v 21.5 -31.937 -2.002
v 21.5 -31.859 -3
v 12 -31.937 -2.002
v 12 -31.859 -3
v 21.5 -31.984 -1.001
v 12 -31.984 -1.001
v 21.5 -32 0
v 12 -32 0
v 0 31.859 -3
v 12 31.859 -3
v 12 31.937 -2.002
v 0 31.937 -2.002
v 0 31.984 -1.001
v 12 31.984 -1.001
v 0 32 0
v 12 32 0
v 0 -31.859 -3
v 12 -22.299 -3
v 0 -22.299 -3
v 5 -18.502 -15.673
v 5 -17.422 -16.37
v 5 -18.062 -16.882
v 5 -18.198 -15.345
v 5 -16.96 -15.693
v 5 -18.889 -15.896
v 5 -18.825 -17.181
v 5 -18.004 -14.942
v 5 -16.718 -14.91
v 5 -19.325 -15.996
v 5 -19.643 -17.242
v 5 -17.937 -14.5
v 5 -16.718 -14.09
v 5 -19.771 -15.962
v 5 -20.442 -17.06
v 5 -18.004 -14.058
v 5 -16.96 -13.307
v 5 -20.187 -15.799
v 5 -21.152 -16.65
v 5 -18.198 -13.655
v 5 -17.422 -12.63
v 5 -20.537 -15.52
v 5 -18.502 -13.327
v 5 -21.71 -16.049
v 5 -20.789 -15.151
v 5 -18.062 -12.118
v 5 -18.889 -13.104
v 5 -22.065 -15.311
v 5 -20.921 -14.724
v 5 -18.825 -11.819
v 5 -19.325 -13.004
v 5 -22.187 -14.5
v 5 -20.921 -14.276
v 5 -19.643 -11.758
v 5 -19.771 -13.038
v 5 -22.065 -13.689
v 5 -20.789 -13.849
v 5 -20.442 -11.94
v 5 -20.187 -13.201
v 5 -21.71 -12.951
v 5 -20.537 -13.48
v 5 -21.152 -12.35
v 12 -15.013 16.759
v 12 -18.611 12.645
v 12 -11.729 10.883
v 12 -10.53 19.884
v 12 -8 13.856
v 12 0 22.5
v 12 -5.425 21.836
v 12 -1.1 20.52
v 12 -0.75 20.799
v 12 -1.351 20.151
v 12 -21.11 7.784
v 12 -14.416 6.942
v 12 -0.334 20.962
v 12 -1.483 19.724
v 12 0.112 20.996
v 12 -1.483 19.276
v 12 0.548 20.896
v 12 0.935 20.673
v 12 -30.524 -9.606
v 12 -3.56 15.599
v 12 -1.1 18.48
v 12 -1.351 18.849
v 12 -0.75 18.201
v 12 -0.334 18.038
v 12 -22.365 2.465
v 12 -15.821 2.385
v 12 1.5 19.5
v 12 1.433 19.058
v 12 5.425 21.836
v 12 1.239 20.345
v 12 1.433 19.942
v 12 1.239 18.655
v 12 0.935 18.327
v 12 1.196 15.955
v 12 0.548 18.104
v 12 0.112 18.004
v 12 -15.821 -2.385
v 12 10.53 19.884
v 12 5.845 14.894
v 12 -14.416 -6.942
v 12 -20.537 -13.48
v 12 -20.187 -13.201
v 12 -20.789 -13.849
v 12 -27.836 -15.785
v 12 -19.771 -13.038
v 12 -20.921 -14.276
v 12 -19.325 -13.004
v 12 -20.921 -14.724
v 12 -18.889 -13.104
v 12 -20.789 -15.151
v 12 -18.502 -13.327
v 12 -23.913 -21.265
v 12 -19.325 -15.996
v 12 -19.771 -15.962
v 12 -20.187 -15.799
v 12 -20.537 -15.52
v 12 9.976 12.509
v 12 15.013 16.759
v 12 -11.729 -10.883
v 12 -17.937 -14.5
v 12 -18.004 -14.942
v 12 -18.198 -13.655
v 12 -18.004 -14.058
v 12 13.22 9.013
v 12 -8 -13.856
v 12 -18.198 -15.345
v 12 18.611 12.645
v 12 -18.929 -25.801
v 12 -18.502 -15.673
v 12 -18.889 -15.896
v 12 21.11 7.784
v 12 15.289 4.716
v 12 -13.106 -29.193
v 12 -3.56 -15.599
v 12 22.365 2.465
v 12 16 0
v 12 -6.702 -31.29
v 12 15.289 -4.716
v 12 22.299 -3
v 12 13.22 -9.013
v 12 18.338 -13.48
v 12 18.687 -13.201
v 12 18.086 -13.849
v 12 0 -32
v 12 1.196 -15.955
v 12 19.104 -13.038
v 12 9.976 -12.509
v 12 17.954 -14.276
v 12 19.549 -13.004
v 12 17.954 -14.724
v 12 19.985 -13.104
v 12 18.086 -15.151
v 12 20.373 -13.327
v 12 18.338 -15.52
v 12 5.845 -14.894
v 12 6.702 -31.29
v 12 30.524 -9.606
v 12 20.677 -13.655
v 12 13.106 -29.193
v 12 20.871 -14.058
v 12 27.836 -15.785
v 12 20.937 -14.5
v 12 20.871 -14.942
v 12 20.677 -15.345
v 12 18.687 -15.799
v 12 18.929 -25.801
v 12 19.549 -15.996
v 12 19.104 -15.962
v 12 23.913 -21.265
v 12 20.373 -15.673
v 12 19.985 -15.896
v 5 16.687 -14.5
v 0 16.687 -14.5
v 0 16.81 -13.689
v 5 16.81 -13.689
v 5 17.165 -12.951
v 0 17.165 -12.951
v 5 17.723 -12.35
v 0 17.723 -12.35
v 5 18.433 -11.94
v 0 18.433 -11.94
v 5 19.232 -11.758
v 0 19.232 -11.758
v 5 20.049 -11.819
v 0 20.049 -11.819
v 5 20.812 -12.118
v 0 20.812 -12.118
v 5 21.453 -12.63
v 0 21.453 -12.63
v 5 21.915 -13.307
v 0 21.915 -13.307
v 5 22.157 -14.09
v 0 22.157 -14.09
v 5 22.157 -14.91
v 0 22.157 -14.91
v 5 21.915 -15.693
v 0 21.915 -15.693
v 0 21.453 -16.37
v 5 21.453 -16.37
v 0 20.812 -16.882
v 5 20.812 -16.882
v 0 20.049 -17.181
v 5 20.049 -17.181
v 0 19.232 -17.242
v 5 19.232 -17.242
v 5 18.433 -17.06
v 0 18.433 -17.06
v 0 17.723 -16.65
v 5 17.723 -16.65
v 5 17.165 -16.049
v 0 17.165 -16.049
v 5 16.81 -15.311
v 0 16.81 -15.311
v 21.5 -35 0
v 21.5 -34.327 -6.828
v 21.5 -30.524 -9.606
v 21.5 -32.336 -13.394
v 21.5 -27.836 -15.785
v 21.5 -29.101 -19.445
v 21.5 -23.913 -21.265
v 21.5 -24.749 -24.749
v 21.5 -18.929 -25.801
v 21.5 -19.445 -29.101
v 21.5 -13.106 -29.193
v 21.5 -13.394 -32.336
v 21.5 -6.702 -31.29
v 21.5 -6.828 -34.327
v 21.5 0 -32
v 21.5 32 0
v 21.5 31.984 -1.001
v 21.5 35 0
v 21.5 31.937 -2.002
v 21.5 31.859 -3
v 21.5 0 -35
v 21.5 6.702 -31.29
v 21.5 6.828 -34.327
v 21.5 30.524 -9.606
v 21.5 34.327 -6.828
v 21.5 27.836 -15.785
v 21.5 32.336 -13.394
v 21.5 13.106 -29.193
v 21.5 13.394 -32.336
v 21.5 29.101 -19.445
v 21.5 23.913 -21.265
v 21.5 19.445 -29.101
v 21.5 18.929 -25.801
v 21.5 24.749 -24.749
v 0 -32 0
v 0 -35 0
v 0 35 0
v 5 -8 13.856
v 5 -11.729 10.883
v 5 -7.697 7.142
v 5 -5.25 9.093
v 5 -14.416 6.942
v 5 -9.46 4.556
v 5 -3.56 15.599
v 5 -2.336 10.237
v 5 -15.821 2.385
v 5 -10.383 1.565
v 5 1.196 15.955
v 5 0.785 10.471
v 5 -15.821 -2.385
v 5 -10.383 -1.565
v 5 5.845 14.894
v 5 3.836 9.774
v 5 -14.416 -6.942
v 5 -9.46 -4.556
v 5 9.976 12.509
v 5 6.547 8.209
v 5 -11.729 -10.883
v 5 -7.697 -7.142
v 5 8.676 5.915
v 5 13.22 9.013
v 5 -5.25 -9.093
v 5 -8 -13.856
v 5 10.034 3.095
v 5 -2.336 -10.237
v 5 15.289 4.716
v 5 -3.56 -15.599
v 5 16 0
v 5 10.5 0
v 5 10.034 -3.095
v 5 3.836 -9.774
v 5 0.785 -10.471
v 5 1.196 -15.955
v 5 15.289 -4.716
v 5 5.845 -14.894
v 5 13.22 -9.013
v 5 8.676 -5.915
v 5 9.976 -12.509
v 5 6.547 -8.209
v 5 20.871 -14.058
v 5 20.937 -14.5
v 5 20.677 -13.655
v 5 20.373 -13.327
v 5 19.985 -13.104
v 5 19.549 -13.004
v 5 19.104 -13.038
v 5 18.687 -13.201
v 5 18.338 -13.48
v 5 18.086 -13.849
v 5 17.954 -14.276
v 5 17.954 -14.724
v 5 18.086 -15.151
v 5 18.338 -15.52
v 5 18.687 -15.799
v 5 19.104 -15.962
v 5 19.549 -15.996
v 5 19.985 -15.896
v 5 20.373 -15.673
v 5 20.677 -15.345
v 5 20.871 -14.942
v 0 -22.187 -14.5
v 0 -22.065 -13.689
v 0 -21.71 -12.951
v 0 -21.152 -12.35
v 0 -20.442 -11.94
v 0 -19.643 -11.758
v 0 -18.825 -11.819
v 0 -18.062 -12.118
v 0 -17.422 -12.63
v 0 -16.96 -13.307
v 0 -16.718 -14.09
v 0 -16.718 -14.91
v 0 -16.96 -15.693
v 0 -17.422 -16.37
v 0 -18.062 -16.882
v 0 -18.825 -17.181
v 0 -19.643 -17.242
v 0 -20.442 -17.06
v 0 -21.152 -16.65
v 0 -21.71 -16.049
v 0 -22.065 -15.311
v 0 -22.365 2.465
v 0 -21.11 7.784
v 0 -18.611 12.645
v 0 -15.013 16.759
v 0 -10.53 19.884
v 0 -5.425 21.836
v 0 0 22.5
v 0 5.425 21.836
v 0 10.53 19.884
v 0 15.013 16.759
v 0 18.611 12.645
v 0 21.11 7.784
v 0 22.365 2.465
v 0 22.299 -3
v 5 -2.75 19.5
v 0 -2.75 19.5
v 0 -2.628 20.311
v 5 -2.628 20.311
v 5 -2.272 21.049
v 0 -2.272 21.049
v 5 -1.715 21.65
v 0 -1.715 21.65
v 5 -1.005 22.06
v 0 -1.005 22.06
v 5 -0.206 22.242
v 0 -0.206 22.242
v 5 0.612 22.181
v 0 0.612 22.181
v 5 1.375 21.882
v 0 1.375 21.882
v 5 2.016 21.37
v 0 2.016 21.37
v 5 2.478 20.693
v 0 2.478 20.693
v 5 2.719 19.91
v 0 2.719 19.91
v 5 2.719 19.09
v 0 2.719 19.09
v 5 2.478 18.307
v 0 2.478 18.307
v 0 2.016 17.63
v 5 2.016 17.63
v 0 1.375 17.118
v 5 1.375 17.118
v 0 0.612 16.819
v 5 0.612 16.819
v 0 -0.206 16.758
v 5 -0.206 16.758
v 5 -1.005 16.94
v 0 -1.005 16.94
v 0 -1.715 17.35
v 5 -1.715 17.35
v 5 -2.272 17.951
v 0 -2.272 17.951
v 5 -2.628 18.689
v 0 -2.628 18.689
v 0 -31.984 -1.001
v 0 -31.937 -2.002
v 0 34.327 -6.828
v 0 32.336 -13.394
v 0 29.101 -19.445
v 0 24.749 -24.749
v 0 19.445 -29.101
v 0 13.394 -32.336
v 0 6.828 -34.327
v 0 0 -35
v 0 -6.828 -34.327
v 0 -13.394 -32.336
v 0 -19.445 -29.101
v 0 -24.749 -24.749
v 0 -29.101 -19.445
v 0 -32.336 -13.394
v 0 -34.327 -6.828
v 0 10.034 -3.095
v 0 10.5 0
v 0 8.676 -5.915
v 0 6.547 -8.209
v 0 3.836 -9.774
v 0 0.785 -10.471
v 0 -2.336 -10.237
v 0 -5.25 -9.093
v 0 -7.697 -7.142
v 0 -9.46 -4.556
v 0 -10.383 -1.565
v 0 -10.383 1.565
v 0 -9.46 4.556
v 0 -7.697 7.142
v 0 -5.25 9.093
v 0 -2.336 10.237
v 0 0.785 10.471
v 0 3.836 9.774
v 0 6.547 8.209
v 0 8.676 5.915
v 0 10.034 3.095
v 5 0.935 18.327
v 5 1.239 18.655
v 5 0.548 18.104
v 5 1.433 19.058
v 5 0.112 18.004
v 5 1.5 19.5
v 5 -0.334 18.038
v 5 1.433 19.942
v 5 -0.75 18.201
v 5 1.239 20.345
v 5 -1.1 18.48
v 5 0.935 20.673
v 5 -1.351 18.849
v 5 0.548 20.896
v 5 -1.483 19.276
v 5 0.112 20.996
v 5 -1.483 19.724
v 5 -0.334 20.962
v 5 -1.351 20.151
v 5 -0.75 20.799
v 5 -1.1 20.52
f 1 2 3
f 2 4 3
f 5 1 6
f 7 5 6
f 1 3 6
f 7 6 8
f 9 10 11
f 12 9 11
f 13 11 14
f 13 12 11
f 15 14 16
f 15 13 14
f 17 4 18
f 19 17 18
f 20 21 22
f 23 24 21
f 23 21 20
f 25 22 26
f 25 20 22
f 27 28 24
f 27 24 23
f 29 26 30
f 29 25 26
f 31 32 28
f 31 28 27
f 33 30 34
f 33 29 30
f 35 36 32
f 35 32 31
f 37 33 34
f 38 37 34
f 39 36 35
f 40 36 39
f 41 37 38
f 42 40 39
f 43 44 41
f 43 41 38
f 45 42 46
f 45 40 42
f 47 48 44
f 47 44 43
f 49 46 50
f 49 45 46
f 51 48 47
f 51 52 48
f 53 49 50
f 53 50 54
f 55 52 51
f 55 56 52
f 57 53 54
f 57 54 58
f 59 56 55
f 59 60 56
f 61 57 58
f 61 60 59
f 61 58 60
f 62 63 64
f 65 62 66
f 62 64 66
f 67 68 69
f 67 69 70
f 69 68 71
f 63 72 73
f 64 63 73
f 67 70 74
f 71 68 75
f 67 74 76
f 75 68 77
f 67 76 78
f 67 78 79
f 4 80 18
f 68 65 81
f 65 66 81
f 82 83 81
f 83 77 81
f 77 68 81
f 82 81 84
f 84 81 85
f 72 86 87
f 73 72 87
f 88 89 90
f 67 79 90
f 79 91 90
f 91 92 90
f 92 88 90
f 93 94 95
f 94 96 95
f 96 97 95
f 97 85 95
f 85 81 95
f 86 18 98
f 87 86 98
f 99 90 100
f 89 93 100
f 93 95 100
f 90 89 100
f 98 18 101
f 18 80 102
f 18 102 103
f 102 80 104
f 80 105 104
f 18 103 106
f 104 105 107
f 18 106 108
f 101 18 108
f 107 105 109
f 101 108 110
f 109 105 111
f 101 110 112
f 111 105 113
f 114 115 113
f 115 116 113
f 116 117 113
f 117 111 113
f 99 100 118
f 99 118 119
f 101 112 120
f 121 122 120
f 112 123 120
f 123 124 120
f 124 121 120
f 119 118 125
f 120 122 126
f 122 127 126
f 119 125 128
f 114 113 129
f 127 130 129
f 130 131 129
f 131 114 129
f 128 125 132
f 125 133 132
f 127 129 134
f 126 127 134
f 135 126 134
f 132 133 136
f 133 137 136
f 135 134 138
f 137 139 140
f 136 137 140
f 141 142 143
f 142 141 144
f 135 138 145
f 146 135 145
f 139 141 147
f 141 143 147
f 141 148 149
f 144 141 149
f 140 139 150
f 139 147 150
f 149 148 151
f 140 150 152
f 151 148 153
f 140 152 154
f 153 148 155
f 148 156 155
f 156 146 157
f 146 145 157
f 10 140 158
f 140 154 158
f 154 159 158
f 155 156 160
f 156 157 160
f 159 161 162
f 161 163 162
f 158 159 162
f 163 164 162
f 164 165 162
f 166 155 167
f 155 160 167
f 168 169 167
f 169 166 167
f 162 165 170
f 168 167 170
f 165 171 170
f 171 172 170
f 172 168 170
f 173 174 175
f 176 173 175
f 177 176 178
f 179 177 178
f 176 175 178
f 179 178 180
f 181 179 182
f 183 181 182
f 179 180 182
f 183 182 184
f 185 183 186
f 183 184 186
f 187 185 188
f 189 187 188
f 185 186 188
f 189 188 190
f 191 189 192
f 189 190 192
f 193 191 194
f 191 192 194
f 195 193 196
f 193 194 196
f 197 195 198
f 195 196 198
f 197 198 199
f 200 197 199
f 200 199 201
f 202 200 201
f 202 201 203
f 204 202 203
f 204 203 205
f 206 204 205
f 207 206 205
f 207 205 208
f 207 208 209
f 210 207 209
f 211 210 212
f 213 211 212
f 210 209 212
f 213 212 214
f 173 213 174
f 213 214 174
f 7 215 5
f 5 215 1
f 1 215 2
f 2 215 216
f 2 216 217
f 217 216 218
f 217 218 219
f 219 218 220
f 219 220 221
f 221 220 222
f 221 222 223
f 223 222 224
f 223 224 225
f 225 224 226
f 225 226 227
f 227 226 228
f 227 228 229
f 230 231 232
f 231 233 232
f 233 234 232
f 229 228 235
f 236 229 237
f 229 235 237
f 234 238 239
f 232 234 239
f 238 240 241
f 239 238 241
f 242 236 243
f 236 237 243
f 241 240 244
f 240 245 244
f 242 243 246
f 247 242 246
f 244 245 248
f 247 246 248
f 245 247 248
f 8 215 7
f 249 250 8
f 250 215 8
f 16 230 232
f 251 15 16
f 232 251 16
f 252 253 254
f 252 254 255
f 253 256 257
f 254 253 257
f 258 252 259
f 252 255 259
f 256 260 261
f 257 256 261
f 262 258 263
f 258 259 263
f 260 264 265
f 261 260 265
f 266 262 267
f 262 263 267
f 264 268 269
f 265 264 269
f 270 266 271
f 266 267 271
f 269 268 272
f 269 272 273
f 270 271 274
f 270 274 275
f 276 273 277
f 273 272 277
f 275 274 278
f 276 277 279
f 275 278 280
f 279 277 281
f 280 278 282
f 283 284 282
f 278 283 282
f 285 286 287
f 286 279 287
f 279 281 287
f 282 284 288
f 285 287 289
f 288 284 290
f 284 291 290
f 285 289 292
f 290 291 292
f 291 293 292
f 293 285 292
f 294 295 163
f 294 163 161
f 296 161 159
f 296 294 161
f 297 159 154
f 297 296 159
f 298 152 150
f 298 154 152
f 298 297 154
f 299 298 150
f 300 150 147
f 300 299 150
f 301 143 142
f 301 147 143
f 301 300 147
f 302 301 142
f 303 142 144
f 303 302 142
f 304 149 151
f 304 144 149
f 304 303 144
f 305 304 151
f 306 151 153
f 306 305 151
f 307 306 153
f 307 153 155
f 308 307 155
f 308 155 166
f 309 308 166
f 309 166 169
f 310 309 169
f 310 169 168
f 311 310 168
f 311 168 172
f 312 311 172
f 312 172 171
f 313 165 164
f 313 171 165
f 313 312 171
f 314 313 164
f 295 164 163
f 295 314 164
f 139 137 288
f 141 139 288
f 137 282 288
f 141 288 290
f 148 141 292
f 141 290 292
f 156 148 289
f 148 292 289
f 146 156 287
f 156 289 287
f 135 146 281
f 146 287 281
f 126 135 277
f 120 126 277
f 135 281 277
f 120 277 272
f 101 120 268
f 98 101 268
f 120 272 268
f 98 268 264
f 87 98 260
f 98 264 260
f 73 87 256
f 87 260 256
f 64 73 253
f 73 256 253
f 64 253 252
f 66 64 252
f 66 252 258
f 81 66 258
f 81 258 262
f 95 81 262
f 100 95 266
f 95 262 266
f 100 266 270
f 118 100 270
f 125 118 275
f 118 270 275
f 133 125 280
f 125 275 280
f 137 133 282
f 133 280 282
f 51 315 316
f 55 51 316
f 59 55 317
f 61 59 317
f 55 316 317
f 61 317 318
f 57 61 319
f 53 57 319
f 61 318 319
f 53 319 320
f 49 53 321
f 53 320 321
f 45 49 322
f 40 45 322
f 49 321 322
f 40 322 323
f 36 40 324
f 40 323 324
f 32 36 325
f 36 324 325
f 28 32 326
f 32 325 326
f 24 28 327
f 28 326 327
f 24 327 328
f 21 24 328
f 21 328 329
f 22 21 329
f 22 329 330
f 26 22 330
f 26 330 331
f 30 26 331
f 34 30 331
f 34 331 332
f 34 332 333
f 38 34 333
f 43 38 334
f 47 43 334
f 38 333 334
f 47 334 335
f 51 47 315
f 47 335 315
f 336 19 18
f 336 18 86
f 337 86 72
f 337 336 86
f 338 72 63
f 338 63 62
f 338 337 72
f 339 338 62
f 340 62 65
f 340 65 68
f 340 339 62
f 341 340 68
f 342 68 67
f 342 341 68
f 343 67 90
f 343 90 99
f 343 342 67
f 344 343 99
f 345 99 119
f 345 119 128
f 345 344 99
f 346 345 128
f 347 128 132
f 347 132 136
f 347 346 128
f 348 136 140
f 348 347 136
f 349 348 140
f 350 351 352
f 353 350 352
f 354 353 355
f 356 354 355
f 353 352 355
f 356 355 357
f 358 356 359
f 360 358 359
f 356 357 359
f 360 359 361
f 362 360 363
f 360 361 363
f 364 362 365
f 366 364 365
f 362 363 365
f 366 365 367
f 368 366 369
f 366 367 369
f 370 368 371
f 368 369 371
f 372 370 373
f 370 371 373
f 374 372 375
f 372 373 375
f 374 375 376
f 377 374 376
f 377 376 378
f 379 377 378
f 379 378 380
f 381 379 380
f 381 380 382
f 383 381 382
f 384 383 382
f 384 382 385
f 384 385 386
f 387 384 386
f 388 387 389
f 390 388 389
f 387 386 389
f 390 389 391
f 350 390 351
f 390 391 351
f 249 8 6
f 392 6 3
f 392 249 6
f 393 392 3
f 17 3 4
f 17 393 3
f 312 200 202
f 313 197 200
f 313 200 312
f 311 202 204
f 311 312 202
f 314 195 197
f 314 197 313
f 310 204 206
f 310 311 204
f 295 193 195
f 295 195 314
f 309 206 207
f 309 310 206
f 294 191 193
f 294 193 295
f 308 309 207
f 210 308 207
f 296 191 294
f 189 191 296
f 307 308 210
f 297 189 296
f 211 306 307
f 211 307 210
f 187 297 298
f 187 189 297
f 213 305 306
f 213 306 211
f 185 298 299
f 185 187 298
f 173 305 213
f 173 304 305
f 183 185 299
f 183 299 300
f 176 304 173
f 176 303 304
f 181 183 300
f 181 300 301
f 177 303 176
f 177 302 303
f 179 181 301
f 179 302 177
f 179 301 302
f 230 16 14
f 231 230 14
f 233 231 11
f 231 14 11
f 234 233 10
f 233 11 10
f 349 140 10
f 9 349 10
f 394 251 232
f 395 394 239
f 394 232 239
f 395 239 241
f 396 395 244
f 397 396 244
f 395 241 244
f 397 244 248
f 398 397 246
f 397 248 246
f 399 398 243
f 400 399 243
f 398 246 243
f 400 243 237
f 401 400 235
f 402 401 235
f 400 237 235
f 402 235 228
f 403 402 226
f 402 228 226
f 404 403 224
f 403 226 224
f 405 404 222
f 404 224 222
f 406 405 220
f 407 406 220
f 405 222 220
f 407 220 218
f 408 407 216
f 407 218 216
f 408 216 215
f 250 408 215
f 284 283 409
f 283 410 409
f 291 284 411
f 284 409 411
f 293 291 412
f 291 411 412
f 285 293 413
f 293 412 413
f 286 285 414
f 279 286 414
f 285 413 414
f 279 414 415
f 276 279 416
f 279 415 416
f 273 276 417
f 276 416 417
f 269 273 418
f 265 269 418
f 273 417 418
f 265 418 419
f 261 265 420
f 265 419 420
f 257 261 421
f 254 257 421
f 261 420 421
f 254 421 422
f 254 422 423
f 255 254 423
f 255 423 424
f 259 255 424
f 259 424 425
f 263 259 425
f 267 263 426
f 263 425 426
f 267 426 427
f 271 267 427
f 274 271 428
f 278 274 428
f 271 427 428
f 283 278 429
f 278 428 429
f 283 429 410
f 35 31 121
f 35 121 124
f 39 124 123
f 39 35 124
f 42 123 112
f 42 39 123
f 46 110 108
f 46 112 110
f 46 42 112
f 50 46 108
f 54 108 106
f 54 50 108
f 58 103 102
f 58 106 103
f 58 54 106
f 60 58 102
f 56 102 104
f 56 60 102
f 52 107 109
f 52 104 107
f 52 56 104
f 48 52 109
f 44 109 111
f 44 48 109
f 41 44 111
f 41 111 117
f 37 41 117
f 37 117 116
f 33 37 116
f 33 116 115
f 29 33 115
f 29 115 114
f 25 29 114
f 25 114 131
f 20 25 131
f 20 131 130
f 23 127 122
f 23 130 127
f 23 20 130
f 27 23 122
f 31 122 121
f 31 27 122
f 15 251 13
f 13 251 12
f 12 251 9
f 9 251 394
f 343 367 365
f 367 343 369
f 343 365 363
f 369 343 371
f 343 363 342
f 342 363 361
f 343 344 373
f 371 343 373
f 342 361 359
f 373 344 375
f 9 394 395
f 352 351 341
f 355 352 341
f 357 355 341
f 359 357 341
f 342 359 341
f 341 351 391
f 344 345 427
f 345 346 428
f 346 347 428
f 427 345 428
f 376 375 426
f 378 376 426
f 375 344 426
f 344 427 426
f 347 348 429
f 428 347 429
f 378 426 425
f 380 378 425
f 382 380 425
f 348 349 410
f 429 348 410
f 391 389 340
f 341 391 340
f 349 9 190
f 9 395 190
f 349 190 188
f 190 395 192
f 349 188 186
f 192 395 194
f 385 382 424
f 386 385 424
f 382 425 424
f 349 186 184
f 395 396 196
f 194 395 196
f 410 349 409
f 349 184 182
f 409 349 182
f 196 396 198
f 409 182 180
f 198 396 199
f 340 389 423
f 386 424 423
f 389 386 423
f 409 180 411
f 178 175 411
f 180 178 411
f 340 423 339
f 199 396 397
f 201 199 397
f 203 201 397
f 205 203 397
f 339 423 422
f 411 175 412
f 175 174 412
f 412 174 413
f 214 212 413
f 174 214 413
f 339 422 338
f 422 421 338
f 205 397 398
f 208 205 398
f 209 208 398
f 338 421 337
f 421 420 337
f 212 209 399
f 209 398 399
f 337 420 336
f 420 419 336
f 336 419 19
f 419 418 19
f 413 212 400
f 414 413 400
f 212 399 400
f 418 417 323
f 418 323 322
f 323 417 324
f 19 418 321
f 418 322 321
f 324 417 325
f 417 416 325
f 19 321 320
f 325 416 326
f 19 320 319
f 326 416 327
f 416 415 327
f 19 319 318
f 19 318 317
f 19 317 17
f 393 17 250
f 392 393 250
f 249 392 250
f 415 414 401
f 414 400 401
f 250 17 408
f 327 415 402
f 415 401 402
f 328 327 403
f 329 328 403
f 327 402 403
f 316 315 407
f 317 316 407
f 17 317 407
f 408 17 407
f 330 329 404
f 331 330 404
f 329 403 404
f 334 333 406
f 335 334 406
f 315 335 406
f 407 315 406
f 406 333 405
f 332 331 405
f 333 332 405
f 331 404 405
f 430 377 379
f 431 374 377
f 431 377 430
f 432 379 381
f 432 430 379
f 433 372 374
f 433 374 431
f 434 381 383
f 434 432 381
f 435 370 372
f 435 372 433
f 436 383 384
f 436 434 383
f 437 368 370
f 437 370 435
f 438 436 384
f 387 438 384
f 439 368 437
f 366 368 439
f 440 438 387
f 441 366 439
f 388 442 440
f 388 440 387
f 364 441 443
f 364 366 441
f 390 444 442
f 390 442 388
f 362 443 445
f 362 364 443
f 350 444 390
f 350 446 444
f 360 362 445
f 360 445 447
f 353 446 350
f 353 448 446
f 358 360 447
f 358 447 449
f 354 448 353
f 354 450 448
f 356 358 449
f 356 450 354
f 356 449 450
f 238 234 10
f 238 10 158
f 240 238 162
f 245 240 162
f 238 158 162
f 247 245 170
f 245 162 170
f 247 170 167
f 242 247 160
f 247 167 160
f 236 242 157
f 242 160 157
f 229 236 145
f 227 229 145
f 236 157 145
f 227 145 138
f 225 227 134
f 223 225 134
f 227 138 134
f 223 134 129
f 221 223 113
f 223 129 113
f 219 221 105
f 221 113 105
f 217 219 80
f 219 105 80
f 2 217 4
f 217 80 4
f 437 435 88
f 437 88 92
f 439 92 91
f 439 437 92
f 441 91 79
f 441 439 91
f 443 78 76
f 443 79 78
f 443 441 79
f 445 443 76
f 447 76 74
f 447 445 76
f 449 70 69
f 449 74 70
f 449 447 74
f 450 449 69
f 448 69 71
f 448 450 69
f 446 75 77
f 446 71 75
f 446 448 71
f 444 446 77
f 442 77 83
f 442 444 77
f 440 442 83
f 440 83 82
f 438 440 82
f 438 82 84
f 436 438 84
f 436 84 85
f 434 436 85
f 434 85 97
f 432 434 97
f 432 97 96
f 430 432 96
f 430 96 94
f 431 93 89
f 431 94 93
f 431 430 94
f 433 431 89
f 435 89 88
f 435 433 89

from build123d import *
from build123d.topology import SkipClean

# Parameters (mm, degrees)
CUT_EXTRUDE1_DEPTH      = 51.931326313
CUT_EXTRUDE1_DEPTH_BACK = 51.931326313
SKETCH2_R               = 1.5
SKETCH3_R               = 2.75
CUT_EXTRUDE2_DEPTH      = 5


with BuildPart() as part:
    # Sketch1 → Revolve1 (revolve)
    with BuildSketch(Plane.XY):
        Polygon((21.5, 35), (21.5, 32), (12, 32), (12, 16), (5, 16), (5, 10.5), (0, 10.5), (0, 35), align=None)
    revolve(axis=Axis((21.5, 0, 0), (-1, 0, 0)))

    # Sketch2 → Cut-Extrude1 (cut, two sides: drawn at the far end of the back side and taken through both)
    with SkipClean():  # the faces are left unmerged after this step: merging them gives an invalid solid
        with BuildSketch(Plane(origin=(12, 0, 0), x_dir=(0, 0, -1), z_dir=(1, 0, 0)).offset(-CUT_EXTRUDE1_DEPTH_BACK)):
            with Locations(Location((-19.5, 0, 0), (0, 0, 90))):
                Circle(SKETCH2_R)
            with Locations(Location((14.5, -19.437399517, 0), (0, 0, 90))):
                Circle(SKETCH2_R)
            with Locations(Location((14.5, 19.437399517, 0), (0, 0, 90))):
                Circle(SKETCH2_R)
            with BuildLine():
                Line((3, 22.299103121), (3, 31.859064644))
                ThreePointArc((3, 31.859064644), (1.501654319, 31.964746742), (0, 32))
                Line((0, 32), (0, 35))
                ThreePointArc((0, 35), (-35, 0), (0, -35))
                Line((0, -35), (0, -32))
                ThreePointArc((0, -32), (1.501654319, -31.964746742), (3, -31.859064644))
                Line((3, -31.859064644), (3, -22.299103121))
                ThreePointArc((3, -22.299103121), (-22.5, 0), (3, 22.299103121))
            make_face()
        extrude(amount=CUT_EXTRUDE1_DEPTH + CUT_EXTRUDE1_DEPTH_BACK, mode=Mode.SUBTRACT)

    # Sketch3 → Cut-Extrude2 (cut)
    with SkipClean():  # the faces are left unmerged after this step: merging them gives an invalid solid
        with BuildSketch(Plane.ZY):
            with Locations(Location((-14.5, 19.437399517, 0), (0, 0, 270))):
                Circle(SKETCH3_R)
            with Locations(Location((19.5, 0, 0), (0, 0, 270))):
                Circle(SKETCH3_R)
            with Locations(Location((-14.5, -19.437399517, 0), (0, 0, 270))):
                Circle(SKETCH3_R)
        extrude(amount=-CUT_EXTRUDE2_DEPTH, mode=Mode.SUBTRACT)


solid = part.part
